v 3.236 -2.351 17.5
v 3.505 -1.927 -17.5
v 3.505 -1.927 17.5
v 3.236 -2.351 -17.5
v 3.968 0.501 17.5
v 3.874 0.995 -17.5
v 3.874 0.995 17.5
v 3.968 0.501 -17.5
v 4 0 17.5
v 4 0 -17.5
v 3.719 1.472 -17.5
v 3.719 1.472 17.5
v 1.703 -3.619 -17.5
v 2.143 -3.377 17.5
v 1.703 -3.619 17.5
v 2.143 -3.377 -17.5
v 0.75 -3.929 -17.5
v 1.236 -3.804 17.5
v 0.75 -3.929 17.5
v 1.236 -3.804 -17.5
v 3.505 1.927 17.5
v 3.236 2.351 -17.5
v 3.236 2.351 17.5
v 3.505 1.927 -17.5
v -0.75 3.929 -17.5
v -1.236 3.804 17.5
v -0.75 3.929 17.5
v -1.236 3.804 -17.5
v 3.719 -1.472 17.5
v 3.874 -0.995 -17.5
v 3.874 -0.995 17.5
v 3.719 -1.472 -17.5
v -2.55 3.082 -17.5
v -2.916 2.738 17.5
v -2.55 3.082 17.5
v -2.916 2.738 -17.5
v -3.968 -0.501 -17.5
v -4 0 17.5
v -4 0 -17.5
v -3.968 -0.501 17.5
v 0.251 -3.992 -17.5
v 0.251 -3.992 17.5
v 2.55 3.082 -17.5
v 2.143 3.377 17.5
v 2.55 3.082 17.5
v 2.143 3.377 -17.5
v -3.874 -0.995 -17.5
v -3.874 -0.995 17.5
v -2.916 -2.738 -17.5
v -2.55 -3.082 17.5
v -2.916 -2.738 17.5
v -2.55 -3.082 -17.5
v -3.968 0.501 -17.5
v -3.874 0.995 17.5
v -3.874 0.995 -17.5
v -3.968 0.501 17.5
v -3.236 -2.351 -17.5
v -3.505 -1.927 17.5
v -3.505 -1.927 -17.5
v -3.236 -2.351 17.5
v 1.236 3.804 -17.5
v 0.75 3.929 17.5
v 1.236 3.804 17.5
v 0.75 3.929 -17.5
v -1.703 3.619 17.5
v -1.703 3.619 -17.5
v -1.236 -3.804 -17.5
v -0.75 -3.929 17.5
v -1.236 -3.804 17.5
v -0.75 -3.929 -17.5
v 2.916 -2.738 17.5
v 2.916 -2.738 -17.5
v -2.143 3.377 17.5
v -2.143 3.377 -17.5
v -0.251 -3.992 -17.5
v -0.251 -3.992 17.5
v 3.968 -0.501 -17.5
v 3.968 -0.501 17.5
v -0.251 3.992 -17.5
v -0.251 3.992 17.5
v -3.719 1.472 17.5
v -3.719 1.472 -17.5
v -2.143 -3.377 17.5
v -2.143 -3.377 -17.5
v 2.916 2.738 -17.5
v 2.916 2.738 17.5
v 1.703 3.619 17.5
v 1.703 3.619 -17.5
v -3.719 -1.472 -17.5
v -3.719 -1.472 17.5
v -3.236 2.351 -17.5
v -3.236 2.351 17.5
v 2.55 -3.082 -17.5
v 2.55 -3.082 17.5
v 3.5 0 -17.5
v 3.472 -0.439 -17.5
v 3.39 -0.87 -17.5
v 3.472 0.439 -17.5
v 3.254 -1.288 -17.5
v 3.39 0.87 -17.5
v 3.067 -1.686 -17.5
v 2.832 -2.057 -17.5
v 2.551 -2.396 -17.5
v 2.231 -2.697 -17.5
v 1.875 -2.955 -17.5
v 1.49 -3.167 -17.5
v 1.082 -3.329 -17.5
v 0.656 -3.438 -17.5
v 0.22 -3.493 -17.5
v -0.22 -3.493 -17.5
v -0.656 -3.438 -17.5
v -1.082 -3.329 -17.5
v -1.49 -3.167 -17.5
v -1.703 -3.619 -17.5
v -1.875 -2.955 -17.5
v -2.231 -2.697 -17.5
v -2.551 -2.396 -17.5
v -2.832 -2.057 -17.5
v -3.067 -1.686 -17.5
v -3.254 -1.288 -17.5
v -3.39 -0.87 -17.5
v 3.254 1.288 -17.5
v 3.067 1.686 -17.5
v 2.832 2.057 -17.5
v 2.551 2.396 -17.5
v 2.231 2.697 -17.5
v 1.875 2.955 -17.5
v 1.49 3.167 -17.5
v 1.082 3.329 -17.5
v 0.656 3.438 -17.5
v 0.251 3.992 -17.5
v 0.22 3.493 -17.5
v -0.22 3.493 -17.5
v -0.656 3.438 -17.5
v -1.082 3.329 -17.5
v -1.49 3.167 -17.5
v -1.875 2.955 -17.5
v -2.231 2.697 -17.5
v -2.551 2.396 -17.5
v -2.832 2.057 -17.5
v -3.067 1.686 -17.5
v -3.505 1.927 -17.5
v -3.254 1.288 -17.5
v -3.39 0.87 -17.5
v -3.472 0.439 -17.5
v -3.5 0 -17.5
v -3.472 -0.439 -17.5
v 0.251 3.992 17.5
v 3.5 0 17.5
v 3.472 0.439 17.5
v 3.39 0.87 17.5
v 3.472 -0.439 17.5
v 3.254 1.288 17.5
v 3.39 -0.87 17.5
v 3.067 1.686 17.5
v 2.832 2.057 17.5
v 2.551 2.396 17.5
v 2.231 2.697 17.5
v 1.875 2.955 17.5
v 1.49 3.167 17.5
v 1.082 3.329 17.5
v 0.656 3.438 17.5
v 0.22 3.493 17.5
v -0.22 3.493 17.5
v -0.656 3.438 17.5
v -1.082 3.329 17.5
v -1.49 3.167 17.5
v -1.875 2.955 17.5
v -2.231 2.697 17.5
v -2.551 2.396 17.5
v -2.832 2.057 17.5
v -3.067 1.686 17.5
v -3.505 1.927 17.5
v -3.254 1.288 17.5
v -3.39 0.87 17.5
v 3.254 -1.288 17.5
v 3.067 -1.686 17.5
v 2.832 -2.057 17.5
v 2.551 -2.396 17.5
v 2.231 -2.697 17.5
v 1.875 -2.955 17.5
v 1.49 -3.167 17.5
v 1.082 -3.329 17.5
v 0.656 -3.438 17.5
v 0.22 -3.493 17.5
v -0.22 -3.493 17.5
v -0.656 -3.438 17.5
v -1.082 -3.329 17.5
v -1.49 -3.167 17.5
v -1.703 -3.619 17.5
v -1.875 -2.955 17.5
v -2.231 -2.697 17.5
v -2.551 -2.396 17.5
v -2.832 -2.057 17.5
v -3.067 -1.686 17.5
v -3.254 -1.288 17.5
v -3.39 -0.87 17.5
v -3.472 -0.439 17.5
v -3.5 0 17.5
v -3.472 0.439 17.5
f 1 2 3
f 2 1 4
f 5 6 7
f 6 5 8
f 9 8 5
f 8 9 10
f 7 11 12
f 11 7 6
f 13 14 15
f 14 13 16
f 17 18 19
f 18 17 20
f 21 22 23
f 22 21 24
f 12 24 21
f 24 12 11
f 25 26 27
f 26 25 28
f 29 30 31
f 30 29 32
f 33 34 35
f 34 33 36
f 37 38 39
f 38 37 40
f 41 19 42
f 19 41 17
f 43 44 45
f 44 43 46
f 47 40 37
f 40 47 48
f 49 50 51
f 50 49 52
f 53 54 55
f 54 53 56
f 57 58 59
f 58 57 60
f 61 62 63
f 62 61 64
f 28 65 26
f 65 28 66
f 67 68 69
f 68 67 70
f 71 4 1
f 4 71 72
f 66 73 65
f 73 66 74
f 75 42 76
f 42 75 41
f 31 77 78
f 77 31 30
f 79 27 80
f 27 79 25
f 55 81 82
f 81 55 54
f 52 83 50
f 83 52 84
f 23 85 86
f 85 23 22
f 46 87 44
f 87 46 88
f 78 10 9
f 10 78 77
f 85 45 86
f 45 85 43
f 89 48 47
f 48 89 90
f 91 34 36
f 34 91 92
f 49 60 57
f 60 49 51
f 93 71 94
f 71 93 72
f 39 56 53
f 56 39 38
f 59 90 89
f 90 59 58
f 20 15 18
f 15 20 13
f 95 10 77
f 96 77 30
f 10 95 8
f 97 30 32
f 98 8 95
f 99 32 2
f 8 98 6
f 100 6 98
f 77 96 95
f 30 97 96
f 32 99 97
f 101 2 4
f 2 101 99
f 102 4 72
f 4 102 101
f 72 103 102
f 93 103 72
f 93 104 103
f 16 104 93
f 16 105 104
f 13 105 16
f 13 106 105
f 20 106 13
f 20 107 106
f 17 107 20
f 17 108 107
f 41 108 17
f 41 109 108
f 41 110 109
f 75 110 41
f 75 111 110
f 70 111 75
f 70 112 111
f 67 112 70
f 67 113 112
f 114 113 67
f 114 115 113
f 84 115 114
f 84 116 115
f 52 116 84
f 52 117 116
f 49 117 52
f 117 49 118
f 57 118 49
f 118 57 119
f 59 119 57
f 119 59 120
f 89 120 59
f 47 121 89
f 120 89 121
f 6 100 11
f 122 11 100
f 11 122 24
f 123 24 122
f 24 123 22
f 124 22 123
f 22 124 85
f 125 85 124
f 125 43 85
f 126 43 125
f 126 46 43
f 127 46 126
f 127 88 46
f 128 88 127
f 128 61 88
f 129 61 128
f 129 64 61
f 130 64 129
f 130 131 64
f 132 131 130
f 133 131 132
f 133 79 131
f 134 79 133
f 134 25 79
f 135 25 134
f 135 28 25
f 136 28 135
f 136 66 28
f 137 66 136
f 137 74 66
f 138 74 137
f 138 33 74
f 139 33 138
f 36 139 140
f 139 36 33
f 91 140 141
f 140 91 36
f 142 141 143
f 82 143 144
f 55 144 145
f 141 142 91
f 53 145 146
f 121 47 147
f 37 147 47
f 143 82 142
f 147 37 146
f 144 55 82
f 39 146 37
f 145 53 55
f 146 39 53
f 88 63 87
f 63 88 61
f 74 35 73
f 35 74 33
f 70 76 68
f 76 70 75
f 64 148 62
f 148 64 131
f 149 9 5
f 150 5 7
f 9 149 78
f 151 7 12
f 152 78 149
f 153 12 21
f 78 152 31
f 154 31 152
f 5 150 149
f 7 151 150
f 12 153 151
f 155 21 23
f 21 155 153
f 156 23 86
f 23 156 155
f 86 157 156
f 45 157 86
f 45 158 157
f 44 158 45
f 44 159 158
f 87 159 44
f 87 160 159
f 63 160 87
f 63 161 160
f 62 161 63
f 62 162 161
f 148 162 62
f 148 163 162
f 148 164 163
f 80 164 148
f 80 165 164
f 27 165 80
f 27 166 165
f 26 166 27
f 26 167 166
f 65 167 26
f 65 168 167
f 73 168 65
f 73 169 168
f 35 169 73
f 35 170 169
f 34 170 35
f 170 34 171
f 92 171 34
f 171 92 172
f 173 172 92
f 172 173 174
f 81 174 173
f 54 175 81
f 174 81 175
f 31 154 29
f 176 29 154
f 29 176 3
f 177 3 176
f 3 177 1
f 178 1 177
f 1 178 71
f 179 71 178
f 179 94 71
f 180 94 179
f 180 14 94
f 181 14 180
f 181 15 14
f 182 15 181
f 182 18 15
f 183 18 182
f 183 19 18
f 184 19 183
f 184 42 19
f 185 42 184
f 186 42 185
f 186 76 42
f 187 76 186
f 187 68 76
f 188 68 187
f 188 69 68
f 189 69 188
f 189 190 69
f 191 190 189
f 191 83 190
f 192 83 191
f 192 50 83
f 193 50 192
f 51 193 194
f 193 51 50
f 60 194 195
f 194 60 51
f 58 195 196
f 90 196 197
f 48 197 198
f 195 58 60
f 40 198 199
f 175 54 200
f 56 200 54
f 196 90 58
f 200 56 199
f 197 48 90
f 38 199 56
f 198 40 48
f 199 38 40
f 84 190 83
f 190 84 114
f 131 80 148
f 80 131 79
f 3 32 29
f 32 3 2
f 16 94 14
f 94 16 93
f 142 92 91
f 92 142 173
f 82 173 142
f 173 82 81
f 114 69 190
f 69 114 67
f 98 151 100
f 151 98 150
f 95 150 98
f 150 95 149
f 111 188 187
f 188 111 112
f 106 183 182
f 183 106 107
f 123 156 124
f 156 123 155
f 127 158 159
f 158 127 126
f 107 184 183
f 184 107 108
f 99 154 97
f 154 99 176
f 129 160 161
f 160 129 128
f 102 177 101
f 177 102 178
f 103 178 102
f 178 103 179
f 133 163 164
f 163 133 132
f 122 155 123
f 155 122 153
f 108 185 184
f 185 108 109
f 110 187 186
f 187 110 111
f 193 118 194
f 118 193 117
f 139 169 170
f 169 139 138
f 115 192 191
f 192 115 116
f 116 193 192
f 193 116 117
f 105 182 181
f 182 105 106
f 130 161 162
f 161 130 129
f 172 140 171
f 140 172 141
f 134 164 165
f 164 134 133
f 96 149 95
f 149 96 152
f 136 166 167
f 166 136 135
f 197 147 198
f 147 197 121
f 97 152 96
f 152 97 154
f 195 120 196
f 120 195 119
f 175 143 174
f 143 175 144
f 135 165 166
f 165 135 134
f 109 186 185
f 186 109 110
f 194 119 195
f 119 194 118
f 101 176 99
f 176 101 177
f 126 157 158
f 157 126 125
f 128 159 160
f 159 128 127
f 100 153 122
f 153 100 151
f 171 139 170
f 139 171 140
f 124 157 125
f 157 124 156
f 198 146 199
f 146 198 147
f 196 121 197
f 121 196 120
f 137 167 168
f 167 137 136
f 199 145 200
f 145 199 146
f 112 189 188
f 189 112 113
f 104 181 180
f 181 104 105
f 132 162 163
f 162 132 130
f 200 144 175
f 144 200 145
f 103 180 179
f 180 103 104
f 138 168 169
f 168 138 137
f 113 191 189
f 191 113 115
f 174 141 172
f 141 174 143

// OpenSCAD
$fn = 50;


difference() {
	union() {
		translate(v = [0, 0, -17.5000000000]) {
			cylinder(h = 35, r = 4.0000000000);
		}
	}
	union() {
		translate(v = [0, 0, -100.0000000000]) {
			cylinder(h = 200, r = 3.5000000000);
		}
	}
}
